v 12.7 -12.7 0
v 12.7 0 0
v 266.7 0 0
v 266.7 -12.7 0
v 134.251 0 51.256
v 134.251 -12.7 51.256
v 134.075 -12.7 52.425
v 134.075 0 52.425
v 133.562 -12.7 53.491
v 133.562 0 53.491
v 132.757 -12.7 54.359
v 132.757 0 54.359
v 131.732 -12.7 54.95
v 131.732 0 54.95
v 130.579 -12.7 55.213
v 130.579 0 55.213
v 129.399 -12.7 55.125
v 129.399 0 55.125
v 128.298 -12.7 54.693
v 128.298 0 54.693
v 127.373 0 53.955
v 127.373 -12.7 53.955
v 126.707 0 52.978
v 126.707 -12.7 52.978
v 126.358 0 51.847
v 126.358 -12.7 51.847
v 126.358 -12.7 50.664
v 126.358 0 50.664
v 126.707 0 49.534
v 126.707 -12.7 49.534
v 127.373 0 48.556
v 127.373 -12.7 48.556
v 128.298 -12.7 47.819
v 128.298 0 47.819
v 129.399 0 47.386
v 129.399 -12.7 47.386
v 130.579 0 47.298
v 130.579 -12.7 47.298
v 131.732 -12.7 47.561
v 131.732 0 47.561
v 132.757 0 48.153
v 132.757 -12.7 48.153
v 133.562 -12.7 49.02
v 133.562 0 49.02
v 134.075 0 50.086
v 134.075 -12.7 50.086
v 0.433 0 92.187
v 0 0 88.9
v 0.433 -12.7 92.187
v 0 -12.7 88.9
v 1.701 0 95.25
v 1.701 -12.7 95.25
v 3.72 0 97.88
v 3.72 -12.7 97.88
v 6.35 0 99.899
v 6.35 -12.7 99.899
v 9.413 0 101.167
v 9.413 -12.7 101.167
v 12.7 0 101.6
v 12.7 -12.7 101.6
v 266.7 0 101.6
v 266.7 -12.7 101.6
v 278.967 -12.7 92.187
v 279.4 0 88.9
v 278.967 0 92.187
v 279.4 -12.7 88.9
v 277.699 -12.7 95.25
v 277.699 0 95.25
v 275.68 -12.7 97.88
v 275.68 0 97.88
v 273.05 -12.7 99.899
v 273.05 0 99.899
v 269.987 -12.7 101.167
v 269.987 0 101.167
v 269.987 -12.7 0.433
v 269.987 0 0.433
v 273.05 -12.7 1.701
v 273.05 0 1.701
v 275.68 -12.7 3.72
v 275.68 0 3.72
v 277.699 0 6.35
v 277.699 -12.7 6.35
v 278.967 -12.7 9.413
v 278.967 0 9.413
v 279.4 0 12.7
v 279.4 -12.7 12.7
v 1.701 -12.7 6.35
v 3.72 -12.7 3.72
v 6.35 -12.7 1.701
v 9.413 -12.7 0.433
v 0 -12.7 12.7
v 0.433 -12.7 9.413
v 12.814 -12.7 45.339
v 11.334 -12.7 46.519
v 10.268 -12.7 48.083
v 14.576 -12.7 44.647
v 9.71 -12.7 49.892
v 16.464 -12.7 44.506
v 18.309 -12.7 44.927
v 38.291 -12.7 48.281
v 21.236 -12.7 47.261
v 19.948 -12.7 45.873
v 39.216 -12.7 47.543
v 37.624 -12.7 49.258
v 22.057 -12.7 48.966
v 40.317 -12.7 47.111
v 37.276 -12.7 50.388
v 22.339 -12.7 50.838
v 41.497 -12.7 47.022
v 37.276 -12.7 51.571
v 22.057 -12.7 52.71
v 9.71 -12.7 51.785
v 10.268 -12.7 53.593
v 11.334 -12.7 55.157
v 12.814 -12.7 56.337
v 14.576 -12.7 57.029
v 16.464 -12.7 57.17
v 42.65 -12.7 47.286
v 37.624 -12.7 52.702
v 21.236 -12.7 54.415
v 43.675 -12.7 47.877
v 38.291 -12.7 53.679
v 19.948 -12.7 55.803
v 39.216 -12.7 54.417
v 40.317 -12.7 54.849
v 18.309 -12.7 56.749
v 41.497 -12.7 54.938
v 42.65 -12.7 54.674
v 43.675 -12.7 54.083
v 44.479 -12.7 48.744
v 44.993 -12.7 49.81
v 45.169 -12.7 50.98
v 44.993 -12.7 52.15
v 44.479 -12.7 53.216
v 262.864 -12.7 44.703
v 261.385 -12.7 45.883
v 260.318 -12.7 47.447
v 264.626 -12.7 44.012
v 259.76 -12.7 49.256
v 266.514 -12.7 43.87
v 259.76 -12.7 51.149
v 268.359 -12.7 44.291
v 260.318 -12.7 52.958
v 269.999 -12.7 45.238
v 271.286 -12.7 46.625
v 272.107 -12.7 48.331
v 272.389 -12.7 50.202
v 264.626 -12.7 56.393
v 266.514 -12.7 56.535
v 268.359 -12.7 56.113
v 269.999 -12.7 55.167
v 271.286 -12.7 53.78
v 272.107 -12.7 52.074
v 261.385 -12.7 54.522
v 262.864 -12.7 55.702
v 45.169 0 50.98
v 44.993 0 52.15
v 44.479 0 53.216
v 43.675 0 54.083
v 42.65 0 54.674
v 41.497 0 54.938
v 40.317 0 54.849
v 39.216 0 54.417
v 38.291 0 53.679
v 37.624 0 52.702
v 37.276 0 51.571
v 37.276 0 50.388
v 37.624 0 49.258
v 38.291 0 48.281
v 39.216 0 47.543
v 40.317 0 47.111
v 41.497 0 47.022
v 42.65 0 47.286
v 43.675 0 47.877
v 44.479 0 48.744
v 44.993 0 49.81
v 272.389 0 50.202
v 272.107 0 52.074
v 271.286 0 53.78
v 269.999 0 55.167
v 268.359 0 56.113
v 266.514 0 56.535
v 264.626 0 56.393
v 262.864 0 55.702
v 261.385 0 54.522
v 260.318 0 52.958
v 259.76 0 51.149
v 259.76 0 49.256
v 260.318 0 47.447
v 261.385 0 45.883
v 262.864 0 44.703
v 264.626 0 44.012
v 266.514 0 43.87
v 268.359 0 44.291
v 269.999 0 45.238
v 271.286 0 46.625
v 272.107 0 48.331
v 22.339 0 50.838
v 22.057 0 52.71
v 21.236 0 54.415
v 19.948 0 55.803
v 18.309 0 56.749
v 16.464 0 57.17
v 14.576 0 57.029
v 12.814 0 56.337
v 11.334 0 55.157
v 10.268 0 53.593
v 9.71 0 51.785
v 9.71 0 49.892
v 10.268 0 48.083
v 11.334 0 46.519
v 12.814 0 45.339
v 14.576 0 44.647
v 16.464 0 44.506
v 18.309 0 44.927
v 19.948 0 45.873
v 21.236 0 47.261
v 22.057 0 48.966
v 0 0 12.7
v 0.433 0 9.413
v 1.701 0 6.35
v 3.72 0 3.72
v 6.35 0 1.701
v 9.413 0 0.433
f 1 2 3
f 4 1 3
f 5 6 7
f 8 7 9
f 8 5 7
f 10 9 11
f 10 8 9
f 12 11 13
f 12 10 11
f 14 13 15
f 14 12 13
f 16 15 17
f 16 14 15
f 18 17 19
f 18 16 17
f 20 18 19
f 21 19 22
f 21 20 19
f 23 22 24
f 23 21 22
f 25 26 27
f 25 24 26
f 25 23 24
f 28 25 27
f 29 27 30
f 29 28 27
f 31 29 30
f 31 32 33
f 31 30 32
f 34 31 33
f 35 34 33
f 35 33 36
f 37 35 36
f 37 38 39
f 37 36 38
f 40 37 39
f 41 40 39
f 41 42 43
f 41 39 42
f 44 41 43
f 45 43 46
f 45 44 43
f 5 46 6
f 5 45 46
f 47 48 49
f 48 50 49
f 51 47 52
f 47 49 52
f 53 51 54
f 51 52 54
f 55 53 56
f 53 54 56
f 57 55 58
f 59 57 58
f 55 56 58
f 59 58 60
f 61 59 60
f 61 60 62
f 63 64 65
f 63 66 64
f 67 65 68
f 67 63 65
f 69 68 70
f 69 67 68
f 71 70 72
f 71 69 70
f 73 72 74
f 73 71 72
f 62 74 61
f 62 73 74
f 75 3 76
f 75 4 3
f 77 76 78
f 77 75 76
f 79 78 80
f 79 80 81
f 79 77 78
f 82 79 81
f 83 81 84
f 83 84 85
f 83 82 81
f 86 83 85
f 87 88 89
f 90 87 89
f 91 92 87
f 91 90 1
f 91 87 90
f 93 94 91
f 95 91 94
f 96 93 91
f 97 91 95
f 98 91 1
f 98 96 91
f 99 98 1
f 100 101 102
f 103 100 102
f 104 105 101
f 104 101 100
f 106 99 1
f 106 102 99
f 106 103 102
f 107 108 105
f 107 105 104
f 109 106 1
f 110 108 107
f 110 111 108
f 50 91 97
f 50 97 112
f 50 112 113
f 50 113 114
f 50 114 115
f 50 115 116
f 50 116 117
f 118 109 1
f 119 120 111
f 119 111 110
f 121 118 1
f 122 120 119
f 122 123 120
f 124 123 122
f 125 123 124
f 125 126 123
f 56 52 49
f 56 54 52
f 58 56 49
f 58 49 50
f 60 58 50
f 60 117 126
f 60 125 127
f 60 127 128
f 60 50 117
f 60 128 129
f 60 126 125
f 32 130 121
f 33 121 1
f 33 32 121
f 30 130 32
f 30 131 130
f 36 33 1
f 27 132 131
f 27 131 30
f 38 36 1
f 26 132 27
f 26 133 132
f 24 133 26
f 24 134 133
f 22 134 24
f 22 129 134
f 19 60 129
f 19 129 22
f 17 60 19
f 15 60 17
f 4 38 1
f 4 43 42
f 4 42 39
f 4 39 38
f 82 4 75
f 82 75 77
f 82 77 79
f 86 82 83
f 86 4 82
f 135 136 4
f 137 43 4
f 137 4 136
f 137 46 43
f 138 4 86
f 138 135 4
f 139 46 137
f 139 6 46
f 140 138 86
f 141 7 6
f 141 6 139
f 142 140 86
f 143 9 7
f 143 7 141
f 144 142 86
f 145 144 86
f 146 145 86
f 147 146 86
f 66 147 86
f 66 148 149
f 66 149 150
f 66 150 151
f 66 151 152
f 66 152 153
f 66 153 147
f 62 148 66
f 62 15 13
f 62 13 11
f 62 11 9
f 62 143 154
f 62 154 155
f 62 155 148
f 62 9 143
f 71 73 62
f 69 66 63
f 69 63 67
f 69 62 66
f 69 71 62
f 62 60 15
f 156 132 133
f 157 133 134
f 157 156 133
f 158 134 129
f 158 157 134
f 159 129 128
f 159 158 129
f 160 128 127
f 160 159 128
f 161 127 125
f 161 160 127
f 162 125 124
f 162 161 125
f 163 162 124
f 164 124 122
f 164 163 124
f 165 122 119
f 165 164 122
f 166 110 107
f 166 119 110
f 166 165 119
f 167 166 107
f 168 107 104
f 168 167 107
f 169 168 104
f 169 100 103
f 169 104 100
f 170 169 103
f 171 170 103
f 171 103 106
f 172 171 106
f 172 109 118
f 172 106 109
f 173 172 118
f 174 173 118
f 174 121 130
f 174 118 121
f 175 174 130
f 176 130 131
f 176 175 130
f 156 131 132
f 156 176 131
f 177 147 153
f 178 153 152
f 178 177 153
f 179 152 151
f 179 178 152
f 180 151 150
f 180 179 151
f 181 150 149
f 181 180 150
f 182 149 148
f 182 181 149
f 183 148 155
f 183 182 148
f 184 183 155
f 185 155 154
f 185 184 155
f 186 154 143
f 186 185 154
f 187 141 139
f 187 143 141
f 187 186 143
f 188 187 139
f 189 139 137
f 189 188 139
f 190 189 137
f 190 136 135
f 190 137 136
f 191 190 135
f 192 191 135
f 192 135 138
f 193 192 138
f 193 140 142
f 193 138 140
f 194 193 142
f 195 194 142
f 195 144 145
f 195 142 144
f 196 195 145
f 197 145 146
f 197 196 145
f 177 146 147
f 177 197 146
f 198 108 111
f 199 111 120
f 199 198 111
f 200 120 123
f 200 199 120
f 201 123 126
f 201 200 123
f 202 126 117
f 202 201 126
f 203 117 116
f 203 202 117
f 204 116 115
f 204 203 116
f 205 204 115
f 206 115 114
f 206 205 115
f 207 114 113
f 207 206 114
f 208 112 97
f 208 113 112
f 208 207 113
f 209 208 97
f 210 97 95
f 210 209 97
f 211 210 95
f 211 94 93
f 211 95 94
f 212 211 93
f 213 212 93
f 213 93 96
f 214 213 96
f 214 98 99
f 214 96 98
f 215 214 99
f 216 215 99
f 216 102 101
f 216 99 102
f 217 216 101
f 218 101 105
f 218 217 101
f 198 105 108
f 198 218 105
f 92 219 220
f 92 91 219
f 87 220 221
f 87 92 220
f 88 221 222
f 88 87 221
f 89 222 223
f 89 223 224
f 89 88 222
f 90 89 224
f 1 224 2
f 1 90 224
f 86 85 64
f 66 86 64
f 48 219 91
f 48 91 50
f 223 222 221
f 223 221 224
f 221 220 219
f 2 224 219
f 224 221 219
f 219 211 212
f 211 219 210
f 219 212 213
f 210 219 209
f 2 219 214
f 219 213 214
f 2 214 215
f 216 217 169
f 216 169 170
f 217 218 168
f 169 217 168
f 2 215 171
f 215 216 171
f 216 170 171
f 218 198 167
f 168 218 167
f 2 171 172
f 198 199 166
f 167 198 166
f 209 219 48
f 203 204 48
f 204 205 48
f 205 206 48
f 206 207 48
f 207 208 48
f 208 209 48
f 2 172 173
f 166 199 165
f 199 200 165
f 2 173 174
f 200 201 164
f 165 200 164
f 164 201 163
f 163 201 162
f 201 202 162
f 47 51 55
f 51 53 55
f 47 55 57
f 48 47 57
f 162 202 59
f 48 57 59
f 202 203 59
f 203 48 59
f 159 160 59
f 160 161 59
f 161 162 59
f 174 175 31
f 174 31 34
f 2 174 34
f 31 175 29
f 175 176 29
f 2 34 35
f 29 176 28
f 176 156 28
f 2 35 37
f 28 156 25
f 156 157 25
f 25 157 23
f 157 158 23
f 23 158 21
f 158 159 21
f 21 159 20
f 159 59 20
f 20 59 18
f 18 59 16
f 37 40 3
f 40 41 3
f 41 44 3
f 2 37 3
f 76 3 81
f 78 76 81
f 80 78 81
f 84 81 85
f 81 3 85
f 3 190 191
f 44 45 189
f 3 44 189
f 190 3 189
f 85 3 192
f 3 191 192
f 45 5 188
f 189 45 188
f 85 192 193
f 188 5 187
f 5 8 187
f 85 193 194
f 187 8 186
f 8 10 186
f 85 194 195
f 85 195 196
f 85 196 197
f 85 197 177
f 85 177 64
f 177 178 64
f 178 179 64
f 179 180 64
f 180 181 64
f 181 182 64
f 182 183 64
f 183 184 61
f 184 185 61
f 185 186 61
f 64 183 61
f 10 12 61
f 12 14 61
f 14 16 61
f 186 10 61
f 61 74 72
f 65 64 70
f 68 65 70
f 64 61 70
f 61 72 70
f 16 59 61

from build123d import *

# Parameters (mm, degrees)
F0_W     = 279.4
F0_H     = 101.6
F1_DEPTH = 12.7
F2_R     = 12.7
F3_R     = 6.35
F3_R_2   = 3.96875
F4_DEPTH = 22.86


with BuildPart() as f1:
    # F0 (on Front) → F1 (new body)
    with BuildSketch(Plane.XZ):
        with Locations((139.7, 50.8)):
            Rectangle(F0_W, F0_H)
    extrude(amount=F1_DEPTH)

    # F2
    f2_edges = [f1.edges().sort_by_distance(p)[0] for p in [
        (0, -6.35, 101.6),
        (279.4, -6.35, 101.6),
        (279.4, -6.35, 0),
        (0, -6.35, 0),
    ]]
    fillet(f2_edges, radius=F2_R)

    # F3 (on Front) → F4 (cut)
    with BuildSketch(Plane.XZ):
        with Locations((15.989296, 50.838098)):
            Circle(F3_R)
        with Locations((41.200113, 50.979976)):
            Circle(F3_R_2)
        with Locations((130.282387, 51.25564)):
            Circle(F3_R_2)
        with Locations((266.039491, 50.202426)):
            Circle(F3_R)
    extrude(amount=F4_DEPTH, mode=Mode.SUBTRACT)


solid = f1.part
